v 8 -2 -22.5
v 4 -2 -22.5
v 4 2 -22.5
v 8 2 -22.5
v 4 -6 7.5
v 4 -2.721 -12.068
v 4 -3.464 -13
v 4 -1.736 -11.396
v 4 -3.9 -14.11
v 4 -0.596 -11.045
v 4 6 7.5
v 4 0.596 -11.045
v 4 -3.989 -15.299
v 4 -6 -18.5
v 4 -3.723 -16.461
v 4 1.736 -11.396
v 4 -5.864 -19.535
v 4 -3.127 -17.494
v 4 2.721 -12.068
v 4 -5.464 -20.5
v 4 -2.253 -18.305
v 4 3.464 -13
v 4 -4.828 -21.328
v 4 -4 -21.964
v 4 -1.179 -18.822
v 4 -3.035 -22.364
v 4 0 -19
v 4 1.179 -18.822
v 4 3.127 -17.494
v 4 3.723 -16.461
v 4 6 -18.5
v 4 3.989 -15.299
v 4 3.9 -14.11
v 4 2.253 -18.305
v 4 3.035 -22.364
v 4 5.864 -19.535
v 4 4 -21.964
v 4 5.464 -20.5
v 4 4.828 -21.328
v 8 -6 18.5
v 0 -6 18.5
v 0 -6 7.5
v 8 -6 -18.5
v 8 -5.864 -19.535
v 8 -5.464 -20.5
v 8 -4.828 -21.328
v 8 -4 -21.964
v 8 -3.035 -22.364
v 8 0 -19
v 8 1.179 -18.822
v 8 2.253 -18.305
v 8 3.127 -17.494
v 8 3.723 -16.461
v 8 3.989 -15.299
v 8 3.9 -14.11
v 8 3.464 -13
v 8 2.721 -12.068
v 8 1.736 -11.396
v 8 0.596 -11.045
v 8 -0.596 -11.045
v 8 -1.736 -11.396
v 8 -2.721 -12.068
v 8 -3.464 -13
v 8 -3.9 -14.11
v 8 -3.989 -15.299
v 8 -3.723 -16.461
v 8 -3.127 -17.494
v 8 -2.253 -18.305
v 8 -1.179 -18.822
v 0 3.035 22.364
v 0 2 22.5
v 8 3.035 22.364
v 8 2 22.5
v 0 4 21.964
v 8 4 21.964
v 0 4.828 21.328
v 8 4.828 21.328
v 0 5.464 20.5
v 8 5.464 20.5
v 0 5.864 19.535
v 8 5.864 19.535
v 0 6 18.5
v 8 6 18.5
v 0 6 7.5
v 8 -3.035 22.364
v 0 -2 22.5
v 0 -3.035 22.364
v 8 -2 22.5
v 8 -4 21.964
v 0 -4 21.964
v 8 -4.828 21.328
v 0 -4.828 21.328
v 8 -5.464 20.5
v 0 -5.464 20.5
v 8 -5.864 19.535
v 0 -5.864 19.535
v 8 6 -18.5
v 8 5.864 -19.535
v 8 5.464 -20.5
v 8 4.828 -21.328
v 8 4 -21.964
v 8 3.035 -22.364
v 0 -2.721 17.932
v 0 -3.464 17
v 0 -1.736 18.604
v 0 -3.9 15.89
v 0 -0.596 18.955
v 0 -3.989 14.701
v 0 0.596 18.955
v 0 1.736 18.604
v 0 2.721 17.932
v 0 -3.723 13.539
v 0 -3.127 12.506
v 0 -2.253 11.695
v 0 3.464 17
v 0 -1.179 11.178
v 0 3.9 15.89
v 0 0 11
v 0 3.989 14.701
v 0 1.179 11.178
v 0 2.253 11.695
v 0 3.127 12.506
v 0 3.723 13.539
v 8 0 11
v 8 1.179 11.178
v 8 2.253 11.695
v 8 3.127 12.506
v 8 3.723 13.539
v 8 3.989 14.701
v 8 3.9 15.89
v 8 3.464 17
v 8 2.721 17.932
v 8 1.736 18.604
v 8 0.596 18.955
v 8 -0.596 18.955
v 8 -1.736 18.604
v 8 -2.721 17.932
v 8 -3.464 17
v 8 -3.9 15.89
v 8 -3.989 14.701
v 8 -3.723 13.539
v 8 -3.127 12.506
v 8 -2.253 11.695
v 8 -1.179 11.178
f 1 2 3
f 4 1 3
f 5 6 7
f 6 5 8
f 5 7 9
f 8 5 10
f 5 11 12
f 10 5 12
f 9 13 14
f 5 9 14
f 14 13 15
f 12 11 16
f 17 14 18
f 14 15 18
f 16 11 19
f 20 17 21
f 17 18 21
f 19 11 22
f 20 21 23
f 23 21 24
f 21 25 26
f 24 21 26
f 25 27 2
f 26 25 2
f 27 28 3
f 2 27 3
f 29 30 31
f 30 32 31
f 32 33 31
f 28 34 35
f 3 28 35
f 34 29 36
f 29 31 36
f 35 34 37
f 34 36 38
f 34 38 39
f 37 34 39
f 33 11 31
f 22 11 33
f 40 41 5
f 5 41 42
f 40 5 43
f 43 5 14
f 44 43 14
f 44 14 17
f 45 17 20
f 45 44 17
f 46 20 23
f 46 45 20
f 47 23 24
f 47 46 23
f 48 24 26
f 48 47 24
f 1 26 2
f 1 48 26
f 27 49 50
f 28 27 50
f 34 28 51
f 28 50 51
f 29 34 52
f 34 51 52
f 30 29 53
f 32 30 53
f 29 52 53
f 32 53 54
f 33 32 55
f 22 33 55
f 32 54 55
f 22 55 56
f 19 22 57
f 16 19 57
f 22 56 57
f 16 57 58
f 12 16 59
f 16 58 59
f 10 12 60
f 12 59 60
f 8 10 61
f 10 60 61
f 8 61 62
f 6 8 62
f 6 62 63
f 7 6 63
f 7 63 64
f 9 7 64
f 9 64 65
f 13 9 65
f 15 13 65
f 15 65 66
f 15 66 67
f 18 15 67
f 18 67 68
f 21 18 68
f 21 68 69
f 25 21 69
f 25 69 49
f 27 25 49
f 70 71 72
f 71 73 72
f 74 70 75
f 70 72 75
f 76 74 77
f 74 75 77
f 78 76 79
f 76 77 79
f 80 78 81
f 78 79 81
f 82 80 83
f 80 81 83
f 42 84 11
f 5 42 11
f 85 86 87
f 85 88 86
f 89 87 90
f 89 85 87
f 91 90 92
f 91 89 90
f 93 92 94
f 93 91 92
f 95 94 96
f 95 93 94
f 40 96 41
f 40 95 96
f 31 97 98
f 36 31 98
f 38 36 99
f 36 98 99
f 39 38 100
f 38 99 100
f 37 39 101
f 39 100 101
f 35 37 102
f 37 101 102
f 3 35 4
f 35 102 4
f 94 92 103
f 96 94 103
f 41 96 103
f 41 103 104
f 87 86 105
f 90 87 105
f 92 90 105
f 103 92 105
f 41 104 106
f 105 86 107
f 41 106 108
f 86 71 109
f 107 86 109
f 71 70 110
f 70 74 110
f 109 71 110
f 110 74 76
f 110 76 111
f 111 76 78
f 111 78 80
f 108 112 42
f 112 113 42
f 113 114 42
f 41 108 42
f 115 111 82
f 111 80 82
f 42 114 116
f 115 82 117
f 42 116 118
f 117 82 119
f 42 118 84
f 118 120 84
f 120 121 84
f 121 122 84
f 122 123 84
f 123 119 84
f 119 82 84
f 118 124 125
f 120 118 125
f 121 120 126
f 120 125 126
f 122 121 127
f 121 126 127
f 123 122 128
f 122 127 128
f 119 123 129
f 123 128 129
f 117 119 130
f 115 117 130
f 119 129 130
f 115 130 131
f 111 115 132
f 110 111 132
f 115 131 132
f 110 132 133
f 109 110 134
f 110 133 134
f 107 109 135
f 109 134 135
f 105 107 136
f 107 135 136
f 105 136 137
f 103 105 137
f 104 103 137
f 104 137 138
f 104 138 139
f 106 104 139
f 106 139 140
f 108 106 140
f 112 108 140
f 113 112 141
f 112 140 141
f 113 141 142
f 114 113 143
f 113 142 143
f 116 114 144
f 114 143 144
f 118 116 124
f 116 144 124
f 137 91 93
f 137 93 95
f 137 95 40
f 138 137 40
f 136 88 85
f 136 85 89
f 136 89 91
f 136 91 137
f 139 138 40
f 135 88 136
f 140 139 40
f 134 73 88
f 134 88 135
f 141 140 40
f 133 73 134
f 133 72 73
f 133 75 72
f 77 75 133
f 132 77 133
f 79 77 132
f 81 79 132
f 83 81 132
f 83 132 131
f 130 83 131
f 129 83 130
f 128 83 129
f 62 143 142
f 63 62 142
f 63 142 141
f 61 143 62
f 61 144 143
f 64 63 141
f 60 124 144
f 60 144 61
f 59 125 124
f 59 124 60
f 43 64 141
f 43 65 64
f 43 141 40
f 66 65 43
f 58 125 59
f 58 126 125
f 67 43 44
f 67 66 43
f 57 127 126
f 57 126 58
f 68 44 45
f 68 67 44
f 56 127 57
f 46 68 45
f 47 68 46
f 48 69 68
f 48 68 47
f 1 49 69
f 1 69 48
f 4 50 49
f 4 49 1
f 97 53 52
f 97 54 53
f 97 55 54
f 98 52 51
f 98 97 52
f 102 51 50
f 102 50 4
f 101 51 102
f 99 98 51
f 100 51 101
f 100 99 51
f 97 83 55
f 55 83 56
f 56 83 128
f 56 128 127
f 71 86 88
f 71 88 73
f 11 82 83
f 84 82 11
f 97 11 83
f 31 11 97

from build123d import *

# Parameters (mm, degrees)
SKETCH1_W           = 45
SKETCH1_H           = 12
BOSS_EXTRUDE1_DEPTH = 8
SKETCH2_R           = 4
CUT_EXTRUDE1_DEPTH  = 8
FILLET1_R           = 4
SKETCH3_W           = 4
SKETCH3_H           = 39.830583049
CUT_EXTRUDE2_DEPTH  = 16


with BuildPart() as part:
    # Sketch1 → Boss-Extrude1 (new body)
    with BuildSketch(Plane(origin=(0, 0, 0), x_dir=(0, 0, -1), z_dir=(1, 0, 0))):
        Rectangle(SKETCH1_W, SKETCH1_H)
    extrude(amount=BOSS_EXTRUDE1_DEPTH)

    # Sketch2 → Cut-Extrude1 (cut)
    with BuildSketch(Plane(origin=(8, 0, 0), x_dir=(0, 0, -1), z_dir=(1, 0, 0))):
        with Locations((-15, 0)):
            Circle(SKETCH2_R)
        with Locations((15, 0)):
            Circle(SKETCH2_R)
    extrude(amount=-CUT_EXTRUDE1_DEPTH, mode=Mode.SUBTRACT)

    # Fillet1
    fillet1_edges = [part.edges().sort_by_distance(p)[0] for p in [
        (4, -6, -22.5),
        (4, -6, 22.5),
        (4, 6, 22.5),
        (4, 6, -22.5),
    ]]
    fillet(fillet1_edges, radius=FILLET1_R)

    # Sketch3 → Cut-Extrude2 (cut)
    with BuildSketch(Plane(origin=(0, 6, 0), x_dir=(1, 0, 0), z_dir=(0, 1, 0))):
        with Locations((2, 12.415291525)):
            Rectangle(SKETCH3_W, SKETCH3_H)
    extrude(amount=-CUT_EXTRUDE2_DEPTH, mode=Mode.SUBTRACT)


solid = part.part
